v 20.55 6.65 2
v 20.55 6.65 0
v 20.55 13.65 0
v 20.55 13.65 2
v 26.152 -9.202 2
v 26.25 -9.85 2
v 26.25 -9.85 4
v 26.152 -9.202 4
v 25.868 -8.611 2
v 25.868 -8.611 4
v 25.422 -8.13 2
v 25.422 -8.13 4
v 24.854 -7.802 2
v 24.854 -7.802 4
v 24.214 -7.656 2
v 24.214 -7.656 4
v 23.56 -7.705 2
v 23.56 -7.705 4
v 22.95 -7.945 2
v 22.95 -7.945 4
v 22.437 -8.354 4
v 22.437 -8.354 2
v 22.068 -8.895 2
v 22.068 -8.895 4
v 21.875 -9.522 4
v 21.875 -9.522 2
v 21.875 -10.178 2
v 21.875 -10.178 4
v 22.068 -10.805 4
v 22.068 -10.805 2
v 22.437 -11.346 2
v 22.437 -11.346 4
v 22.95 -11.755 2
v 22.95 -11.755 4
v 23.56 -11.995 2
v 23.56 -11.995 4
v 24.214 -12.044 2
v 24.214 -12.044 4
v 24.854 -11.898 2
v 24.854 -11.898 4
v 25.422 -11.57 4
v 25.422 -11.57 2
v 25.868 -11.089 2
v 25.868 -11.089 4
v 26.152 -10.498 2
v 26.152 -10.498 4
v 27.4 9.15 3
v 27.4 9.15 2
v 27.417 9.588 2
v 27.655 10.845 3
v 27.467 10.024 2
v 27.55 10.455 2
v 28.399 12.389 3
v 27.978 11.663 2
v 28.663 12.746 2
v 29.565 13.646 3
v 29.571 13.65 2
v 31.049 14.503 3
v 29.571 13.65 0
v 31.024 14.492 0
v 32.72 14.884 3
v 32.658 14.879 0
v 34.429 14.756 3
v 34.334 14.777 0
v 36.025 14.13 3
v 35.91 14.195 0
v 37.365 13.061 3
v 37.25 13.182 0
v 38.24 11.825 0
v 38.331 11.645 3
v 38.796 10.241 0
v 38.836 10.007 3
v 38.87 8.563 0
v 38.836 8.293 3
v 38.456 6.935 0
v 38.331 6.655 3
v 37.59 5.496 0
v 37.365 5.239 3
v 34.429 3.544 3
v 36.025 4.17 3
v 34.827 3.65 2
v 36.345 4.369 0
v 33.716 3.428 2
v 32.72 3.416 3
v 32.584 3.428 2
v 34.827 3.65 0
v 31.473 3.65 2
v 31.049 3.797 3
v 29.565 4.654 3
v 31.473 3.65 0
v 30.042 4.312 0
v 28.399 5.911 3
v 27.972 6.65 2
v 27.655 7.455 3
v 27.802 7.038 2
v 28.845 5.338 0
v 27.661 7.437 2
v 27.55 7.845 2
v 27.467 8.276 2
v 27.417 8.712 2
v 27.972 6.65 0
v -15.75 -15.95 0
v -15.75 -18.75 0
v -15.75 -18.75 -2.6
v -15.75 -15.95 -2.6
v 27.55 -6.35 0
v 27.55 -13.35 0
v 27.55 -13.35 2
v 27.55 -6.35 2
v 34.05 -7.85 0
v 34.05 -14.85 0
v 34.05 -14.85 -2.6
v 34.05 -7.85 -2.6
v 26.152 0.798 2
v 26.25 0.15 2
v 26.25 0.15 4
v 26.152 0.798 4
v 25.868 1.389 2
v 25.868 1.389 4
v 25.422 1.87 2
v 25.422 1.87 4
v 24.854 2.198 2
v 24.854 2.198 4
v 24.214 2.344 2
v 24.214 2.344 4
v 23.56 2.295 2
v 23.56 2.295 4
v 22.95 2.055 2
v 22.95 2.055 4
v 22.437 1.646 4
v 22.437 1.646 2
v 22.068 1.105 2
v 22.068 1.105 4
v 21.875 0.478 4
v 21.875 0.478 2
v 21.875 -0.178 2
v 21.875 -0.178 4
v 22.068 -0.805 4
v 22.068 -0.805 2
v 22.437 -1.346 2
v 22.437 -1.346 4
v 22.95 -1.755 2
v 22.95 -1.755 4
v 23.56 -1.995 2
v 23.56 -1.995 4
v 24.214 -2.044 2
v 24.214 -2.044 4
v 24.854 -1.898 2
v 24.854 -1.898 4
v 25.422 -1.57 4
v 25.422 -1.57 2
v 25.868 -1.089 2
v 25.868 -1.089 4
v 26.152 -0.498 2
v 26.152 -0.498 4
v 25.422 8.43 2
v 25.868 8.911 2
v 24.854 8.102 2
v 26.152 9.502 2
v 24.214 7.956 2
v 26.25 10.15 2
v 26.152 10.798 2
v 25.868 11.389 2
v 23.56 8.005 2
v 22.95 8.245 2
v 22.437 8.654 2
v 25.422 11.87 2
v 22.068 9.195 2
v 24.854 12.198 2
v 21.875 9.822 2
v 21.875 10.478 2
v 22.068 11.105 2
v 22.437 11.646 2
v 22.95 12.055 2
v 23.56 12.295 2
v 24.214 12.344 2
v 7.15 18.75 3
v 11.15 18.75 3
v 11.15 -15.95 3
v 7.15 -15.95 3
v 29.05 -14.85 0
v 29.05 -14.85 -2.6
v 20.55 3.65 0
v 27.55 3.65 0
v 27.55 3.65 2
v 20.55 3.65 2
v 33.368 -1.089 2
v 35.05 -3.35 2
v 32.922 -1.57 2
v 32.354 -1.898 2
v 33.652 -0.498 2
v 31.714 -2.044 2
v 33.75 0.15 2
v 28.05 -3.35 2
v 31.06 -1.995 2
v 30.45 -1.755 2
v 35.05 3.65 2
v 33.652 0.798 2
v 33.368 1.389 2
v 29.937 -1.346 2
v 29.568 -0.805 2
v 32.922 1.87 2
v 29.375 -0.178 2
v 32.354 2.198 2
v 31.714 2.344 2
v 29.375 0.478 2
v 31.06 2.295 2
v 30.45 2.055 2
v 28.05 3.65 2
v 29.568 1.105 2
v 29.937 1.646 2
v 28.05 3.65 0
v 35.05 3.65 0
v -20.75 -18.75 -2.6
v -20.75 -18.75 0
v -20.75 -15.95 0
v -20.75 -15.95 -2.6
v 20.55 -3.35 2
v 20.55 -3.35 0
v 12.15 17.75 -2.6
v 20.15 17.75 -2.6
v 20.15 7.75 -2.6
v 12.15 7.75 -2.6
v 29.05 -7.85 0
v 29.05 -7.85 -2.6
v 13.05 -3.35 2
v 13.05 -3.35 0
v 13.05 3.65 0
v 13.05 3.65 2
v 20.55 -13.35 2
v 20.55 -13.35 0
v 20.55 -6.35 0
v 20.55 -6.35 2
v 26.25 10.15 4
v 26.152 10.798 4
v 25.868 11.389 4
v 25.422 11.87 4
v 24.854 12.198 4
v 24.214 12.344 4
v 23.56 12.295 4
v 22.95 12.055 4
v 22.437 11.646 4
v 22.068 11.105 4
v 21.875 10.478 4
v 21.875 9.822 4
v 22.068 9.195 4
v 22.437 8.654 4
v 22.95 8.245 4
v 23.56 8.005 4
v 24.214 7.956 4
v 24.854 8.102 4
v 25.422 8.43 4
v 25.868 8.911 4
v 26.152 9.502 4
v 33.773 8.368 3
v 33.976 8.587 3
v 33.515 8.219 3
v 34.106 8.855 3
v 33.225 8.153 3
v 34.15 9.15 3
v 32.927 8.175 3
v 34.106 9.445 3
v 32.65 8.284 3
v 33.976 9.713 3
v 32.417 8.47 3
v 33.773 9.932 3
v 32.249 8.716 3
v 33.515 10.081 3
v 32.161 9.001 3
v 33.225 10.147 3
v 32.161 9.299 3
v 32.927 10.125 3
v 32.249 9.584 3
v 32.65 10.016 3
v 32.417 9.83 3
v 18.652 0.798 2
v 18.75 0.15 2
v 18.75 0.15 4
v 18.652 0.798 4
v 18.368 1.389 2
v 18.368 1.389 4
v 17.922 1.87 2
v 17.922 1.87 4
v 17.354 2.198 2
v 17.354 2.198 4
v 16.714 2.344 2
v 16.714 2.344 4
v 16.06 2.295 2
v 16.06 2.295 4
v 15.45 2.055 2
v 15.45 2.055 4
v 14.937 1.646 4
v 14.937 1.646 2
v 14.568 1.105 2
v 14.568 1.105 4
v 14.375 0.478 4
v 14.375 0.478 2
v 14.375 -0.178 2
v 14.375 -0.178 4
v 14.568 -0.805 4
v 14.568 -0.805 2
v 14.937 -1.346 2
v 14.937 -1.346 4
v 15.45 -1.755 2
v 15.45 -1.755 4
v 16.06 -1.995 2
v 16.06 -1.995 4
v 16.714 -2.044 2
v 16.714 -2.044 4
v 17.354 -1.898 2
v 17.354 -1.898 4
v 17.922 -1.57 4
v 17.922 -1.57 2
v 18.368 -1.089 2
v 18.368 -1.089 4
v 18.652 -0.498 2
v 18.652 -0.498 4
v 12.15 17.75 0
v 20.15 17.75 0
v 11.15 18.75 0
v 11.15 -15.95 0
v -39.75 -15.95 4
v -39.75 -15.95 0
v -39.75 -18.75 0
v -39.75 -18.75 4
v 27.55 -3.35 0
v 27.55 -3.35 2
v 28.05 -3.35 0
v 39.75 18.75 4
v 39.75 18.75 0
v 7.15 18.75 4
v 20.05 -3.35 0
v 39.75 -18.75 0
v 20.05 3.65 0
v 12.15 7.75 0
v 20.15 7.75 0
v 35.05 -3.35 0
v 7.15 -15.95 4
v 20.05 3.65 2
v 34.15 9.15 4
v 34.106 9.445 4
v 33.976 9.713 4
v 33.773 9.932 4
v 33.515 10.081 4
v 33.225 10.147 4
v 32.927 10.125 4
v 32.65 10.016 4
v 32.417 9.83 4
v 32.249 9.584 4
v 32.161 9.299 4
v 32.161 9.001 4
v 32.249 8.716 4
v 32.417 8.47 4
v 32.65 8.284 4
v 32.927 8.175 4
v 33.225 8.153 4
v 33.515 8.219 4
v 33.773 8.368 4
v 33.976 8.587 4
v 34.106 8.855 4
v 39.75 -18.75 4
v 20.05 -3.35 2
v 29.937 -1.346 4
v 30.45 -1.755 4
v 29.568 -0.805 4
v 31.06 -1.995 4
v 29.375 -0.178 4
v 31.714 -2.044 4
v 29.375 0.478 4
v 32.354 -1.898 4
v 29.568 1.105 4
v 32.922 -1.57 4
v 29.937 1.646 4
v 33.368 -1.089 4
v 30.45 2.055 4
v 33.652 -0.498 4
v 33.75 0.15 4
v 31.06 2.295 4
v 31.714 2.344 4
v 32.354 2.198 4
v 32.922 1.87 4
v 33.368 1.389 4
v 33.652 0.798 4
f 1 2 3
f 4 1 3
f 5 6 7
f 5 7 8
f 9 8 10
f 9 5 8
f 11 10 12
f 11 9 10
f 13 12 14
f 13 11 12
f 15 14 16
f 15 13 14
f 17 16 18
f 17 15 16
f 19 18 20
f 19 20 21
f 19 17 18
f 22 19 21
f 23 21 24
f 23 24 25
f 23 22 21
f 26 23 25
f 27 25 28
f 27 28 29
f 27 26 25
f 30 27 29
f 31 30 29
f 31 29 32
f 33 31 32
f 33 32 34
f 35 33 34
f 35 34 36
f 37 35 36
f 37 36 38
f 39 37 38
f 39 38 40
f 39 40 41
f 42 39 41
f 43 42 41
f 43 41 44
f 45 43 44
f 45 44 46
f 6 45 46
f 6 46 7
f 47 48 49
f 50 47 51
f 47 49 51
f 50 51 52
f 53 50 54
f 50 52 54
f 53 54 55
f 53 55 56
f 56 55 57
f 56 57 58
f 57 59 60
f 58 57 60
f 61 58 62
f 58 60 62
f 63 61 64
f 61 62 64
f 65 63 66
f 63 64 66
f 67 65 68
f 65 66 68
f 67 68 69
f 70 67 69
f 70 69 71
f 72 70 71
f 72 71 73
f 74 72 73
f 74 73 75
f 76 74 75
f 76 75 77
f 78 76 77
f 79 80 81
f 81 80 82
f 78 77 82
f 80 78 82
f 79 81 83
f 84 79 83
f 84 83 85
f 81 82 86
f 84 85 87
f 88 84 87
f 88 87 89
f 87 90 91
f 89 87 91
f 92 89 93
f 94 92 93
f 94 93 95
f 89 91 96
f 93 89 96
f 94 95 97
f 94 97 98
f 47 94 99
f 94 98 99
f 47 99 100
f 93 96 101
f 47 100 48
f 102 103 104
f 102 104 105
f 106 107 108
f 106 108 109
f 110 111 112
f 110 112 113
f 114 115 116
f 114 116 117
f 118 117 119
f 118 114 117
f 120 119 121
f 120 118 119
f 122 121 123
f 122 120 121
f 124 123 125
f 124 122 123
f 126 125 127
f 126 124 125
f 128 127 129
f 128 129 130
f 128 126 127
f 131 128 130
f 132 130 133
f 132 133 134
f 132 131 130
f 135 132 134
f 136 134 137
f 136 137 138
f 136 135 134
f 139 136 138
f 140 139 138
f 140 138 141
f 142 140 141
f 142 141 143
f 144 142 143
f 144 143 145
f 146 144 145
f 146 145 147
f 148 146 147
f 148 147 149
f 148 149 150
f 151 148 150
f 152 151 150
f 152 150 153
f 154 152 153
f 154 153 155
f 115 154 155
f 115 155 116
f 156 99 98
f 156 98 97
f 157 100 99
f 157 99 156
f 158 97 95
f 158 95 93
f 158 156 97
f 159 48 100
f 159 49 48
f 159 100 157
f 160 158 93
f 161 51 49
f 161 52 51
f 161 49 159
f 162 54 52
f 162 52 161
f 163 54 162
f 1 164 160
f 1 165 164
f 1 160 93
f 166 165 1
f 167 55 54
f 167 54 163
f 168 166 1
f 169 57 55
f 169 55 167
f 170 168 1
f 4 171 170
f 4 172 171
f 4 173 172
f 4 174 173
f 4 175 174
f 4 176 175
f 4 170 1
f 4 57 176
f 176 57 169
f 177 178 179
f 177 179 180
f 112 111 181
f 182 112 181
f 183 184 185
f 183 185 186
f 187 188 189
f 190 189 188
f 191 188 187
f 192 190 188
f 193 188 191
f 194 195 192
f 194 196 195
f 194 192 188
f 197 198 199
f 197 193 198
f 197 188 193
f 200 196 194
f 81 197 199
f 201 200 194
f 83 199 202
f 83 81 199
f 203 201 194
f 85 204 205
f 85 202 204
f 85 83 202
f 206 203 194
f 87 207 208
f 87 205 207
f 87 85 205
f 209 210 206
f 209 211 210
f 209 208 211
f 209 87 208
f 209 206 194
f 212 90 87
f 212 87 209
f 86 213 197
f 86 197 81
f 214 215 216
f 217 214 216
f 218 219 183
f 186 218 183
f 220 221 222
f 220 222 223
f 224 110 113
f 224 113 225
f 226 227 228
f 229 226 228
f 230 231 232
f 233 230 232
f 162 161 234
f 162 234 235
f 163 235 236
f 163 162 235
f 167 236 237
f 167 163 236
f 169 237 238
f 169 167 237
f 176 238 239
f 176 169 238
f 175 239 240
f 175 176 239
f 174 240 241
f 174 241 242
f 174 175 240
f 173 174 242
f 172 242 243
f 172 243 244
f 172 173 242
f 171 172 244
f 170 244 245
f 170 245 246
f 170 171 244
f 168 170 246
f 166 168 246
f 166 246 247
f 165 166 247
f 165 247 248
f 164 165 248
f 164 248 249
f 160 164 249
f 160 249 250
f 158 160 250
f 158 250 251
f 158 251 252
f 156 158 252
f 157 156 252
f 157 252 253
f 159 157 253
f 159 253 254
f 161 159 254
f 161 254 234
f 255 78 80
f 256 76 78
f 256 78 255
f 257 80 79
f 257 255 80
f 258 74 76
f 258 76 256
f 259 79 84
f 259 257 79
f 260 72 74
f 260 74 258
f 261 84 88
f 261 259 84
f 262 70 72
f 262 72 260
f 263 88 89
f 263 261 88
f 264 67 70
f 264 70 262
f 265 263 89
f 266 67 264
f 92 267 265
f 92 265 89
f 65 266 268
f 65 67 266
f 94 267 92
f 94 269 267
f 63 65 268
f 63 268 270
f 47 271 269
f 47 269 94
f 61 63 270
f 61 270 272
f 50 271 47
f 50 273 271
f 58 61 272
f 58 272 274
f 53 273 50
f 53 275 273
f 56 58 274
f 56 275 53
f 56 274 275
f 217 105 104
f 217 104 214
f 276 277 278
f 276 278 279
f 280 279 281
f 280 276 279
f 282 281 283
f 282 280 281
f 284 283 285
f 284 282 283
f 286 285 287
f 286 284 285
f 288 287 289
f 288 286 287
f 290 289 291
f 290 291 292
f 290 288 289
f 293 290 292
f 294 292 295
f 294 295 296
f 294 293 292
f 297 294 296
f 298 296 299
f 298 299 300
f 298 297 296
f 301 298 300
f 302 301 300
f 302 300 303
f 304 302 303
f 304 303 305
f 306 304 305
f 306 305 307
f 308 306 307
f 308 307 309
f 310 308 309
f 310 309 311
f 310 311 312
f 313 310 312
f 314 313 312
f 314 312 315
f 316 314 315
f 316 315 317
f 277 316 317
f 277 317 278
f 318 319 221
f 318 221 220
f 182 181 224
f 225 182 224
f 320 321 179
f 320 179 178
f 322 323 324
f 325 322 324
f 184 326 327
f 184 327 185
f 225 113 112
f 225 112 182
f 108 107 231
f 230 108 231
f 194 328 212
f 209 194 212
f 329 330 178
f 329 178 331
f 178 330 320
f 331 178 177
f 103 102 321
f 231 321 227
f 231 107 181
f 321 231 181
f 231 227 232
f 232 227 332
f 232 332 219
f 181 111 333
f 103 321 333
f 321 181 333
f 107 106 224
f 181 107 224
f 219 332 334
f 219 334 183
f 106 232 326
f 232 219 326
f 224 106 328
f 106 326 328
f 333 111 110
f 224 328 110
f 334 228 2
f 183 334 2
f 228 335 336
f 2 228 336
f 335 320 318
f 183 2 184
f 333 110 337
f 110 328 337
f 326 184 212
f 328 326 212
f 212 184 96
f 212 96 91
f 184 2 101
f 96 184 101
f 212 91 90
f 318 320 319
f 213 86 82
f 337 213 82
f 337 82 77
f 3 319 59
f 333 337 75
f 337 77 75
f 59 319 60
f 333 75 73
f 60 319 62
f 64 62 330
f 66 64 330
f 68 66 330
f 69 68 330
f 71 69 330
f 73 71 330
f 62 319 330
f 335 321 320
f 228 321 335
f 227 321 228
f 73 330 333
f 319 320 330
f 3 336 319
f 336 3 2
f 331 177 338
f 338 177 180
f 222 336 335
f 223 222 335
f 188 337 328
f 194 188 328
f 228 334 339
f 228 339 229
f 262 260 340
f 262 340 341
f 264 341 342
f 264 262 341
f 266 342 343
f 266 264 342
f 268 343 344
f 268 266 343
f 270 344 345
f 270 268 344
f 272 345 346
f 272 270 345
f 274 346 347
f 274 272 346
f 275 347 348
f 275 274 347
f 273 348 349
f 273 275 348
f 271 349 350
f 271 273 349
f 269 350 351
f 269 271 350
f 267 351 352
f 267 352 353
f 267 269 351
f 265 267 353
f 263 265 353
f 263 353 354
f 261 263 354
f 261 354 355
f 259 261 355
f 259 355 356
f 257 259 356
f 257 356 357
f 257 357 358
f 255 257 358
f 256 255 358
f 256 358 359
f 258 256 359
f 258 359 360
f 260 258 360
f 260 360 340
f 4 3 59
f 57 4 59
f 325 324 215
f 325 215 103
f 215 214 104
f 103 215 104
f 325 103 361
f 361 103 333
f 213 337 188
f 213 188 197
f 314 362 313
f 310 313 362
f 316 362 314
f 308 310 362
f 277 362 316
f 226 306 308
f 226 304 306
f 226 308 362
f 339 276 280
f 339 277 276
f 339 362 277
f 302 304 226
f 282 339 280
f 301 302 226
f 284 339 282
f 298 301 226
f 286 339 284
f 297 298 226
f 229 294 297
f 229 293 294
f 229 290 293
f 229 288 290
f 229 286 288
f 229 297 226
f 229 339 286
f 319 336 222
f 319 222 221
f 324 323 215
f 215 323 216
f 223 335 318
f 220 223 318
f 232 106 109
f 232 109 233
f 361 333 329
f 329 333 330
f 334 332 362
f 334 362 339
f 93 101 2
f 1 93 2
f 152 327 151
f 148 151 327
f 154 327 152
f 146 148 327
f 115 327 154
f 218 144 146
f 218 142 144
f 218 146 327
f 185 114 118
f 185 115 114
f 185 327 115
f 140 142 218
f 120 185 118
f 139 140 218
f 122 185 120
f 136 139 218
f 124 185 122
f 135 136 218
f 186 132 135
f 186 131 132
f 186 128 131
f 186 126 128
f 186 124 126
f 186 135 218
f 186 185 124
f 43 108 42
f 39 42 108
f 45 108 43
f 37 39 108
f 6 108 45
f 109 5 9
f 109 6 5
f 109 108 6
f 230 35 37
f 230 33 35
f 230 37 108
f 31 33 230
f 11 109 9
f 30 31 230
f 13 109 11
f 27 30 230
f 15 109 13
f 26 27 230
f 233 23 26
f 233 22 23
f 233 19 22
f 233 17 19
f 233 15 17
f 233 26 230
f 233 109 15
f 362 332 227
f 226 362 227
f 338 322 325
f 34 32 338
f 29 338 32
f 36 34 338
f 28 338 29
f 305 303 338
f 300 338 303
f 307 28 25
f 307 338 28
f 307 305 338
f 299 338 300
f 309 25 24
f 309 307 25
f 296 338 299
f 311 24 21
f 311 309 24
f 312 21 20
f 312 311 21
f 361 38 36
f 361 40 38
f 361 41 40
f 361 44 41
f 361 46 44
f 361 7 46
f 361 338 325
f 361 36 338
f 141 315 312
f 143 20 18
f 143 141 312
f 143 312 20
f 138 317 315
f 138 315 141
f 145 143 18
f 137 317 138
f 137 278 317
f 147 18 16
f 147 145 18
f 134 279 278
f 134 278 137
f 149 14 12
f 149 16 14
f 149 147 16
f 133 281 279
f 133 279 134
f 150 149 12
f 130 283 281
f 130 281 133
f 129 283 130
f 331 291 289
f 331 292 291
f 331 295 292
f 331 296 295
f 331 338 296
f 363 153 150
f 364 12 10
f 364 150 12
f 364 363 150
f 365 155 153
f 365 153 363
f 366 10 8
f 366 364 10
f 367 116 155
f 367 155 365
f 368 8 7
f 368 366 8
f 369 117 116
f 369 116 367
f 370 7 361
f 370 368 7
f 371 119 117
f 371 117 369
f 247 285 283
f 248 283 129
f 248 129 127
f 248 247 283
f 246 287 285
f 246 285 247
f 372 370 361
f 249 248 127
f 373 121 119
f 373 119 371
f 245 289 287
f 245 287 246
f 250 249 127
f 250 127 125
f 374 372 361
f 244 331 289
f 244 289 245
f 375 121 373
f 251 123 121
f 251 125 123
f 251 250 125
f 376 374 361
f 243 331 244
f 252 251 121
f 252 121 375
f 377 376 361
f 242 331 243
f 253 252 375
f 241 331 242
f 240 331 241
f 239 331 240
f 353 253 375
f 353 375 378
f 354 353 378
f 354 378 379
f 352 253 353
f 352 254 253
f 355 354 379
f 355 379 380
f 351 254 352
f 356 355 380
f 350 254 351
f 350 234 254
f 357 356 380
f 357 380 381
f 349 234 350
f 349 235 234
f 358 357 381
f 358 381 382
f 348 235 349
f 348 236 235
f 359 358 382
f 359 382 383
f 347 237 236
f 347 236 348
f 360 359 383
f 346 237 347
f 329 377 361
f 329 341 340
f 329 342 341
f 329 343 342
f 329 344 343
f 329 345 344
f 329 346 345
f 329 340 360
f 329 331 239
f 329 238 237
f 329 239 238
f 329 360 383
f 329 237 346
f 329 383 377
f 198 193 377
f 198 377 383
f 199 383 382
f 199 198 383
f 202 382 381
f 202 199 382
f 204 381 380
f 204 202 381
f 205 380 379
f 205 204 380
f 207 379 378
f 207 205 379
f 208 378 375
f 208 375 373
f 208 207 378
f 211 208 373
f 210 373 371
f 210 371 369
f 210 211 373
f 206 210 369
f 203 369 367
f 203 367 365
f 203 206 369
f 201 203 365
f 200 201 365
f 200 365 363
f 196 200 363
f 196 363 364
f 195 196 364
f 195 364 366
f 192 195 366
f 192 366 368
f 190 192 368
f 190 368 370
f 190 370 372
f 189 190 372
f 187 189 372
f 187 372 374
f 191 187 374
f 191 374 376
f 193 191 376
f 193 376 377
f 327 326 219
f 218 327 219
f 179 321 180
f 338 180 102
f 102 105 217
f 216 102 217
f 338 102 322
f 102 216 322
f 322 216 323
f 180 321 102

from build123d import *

# Parameters (mm, degrees)
SZKIC1_R                    = 2.2
SZKIC1_R_2                  = 1
DODANIE_WYCI_GNI_CIE1_DEPTH = 4
SZKIC2_R                    = 5.75
SZKIC2_W                    = 4
SZKIC2_H                    = 34.7
WYTNIJ_WYCI_GNI_CIE1_DEPTH  = 3
SZKIC3_W                    = 5
SZKIC3_H                    = 2.8
SZKIC3_W_2                  = 8
SZKIC3_H_2                  = 10
SZKIC3_H_3                  = 7
DODANIE_WYCI_GNI_CIE2_DEPTH = 2.6
SZKIC4_R                    = 5.75
SZKIC4_W                    = 7
SZKIC4_H                    = 7
SZKIC4_R_2                  = 2.2
WYTNIJ_WYCI_GNI_CIE3_DEPTH  = 2


with BuildPart() as part:
    # Szkic1 → Dodanie-wyciągnięcie1 (new body)
    with BuildSketch(Plane.XY):
        Polygon((-39.75, -15.95), (-39.75, -18.75), (39.75, -18.75), (39.75, 18.75), (7.15, 18.75), (7.15, -15.95), align=None)
        with Locations((24.05, -9.85)):
            Circle(SZKIC1_R, mode=Mode.SUBTRACT)
        with Locations((16.55, 0.15)):
            Circle(SZKIC1_R, mode=Mode.SUBTRACT)
        with Locations((24.05, 0.15)):
            Circle(SZKIC1_R, mode=Mode.SUBTRACT)
        with Locations((31.55, 0.15)):
            Circle(SZKIC1_R, mode=Mode.SUBTRACT)
        with Locations((33.15, 9.15)):
            Circle(SZKIC1_R_2, mode=Mode.SUBTRACT)
        with Locations((24.05, 10.15)):
            Circle(SZKIC1_R, mode=Mode.SUBTRACT)
    extrude(amount=DODANIE_WYCI_GNI_CIE1_DEPTH)

    # Szkic2 → Wytnij-wyciągnięcie1 (cut)
    with BuildSketch(Plane(origin=(0, 0, 0), x_dir=(-1, 0, 0), z_dir=(0, 0, -1))):
        with Locations((-33.15, 9.15)):
            Circle(SZKIC2_R)
        with Locations((-9.15, 1.4)):
            Rectangle(SZKIC2_W, SZKIC2_H)
    extrude(amount=-WYTNIJ_WYCI_GNI_CIE1_DEPTH, mode=Mode.SUBTRACT)

    # Szkic3 → Dodanie-wyciągnięcie2 (add)
    with BuildSketch(Plane(origin=(0, 0, 0), x_dir=(-1, 0, 0), z_dir=(0, 0, -1))):
        with Locations((18.25, -17.35)):
            Rectangle(SZKIC3_W, SZKIC3_H)
        with Locations((-16.15, 12.75)):
            Rectangle(SZKIC3_W_2, SZKIC3_H_2)
        with Locations((-31.55, -11.35)):
            Rectangle(SZKIC3_W, SZKIC3_H_3)
    extrude(amount=DODANIE_WYCI_GNI_CIE2_DEPTH)

    # Szkic4 → Wytnij-wyciągnięcie3 (cut)
    # profile 1 of 9: a face of its own
    with BuildSketch(Plane(origin=(0, 0, 0), x_dir=(-1, 0, 0), z_dir=(0, 0, -1))):
        with BuildLine():
            Line((-27.55, 10.454798835), (-27.55, 13.65))
            Line((-27.55, 13.65), (-29.570544734, 13.65))
            ThreePointArc((-29.570544734, 13.65), (-28.290172085, 12.223202342), (-27.55, 10.454798835))
        make_face()
    # profile 2 of 9: a face of its own
    with BuildSketch(Plane(origin=(0, 0, 0), x_dir=(-1, 0, 0), z_dir=(0, 0, -1))):
        with BuildLine():
            Line((-27.55, 6.65), (-27.55, 7.845201165))
            ThreePointArc((-27.55, 7.845201165), (-27.727927326, 7.235939416), (-27.971921206, 6.65))
            Line((-27.971921206, 6.65), (-27.55, 6.65))
        make_face()
    # profile 3 of 9: a face of its own
    with BuildSketch(Plane(origin=(0, 0, 0), x_dir=(-1, 0, 0), z_dir=(0, 0, -1))):
        with Locations((-33.15, 9.15)):
            Circle(SZKIC4_R)
    # profile 4 of 9: a face of its own
    with BuildSketch(Plane(origin=(0, 0, 0), x_dir=(-1, 0, 0), z_dir=(0, 0, -1))):
        with Locations((-24.05, 10.15)):
            Rectangle(SZKIC4_W, SZKIC4_H)
        with Locations((-24.05, 10.15)):
            Circle(SZKIC4_R_2, mode=Mode.SUBTRACT)
    # profile 5 of 9: a face of its own
    with BuildSketch(Plane(origin=(0, 0, 0), x_dir=(-1, 0, 0), z_dir=(0, 0, -1))):
        with Locations((-24.05, 0.15)):
            Rectangle(SZKIC4_W, SZKIC4_H)
        with Locations((-24.05, 0.15)):
            Circle(SZKIC4_R_2, mode=Mode.SUBTRACT)
    # profile 6 of 9: a face of its own
    with BuildSketch(Plane(origin=(0, 0, 0), x_dir=(-1, 0, 0), z_dir=(0, 0, -1))):
        with Locations((-33.15, 9.15)):
            Circle(SZKIC4_R)
    # profile 7 of 9: a face of its own
    with BuildSketch(Plane(origin=(0, 0, 0), x_dir=(-1, 0, 0), z_dir=(0, 0, -1))):
        with Locations((-31.55, 0.15)):
            Rectangle(SZKIC4_W, SZKIC4_H)
        with Locations((-31.55, 0.15)):
            Circle(SZKIC4_R_2, mode=Mode.SUBTRACT)
    # profile 8 of 9: a face of its own
    with BuildSketch(Plane(origin=(0, 0, 0), x_dir=(-1, 0, 0), z_dir=(0, 0, -1))):
        with Locations((-16.55, 0.15)):
            Rectangle(SZKIC4_W, SZKIC4_H)
        with Locations((-16.55, 0.15)):
            Circle(SZKIC4_R_2, mode=Mode.SUBTRACT)
    # profile 9 of 9: a face of its own
    with BuildSketch(Plane(origin=(0, 0, 0), x_dir=(-1, 0, 0), z_dir=(0, 0, -1))):
        with Locations((-24.05, -9.85)):
            Rectangle(SZKIC4_W, SZKIC4_H)
        with Locations((-24.05, -9.85)):
            Circle(SZKIC4_R_2, mode=Mode.SUBTRACT)
    extrude(amount=-WYTNIJ_WYCI_GNI_CIE3_DEPTH, mode=Mode.SUBTRACT)


solid = part.part
